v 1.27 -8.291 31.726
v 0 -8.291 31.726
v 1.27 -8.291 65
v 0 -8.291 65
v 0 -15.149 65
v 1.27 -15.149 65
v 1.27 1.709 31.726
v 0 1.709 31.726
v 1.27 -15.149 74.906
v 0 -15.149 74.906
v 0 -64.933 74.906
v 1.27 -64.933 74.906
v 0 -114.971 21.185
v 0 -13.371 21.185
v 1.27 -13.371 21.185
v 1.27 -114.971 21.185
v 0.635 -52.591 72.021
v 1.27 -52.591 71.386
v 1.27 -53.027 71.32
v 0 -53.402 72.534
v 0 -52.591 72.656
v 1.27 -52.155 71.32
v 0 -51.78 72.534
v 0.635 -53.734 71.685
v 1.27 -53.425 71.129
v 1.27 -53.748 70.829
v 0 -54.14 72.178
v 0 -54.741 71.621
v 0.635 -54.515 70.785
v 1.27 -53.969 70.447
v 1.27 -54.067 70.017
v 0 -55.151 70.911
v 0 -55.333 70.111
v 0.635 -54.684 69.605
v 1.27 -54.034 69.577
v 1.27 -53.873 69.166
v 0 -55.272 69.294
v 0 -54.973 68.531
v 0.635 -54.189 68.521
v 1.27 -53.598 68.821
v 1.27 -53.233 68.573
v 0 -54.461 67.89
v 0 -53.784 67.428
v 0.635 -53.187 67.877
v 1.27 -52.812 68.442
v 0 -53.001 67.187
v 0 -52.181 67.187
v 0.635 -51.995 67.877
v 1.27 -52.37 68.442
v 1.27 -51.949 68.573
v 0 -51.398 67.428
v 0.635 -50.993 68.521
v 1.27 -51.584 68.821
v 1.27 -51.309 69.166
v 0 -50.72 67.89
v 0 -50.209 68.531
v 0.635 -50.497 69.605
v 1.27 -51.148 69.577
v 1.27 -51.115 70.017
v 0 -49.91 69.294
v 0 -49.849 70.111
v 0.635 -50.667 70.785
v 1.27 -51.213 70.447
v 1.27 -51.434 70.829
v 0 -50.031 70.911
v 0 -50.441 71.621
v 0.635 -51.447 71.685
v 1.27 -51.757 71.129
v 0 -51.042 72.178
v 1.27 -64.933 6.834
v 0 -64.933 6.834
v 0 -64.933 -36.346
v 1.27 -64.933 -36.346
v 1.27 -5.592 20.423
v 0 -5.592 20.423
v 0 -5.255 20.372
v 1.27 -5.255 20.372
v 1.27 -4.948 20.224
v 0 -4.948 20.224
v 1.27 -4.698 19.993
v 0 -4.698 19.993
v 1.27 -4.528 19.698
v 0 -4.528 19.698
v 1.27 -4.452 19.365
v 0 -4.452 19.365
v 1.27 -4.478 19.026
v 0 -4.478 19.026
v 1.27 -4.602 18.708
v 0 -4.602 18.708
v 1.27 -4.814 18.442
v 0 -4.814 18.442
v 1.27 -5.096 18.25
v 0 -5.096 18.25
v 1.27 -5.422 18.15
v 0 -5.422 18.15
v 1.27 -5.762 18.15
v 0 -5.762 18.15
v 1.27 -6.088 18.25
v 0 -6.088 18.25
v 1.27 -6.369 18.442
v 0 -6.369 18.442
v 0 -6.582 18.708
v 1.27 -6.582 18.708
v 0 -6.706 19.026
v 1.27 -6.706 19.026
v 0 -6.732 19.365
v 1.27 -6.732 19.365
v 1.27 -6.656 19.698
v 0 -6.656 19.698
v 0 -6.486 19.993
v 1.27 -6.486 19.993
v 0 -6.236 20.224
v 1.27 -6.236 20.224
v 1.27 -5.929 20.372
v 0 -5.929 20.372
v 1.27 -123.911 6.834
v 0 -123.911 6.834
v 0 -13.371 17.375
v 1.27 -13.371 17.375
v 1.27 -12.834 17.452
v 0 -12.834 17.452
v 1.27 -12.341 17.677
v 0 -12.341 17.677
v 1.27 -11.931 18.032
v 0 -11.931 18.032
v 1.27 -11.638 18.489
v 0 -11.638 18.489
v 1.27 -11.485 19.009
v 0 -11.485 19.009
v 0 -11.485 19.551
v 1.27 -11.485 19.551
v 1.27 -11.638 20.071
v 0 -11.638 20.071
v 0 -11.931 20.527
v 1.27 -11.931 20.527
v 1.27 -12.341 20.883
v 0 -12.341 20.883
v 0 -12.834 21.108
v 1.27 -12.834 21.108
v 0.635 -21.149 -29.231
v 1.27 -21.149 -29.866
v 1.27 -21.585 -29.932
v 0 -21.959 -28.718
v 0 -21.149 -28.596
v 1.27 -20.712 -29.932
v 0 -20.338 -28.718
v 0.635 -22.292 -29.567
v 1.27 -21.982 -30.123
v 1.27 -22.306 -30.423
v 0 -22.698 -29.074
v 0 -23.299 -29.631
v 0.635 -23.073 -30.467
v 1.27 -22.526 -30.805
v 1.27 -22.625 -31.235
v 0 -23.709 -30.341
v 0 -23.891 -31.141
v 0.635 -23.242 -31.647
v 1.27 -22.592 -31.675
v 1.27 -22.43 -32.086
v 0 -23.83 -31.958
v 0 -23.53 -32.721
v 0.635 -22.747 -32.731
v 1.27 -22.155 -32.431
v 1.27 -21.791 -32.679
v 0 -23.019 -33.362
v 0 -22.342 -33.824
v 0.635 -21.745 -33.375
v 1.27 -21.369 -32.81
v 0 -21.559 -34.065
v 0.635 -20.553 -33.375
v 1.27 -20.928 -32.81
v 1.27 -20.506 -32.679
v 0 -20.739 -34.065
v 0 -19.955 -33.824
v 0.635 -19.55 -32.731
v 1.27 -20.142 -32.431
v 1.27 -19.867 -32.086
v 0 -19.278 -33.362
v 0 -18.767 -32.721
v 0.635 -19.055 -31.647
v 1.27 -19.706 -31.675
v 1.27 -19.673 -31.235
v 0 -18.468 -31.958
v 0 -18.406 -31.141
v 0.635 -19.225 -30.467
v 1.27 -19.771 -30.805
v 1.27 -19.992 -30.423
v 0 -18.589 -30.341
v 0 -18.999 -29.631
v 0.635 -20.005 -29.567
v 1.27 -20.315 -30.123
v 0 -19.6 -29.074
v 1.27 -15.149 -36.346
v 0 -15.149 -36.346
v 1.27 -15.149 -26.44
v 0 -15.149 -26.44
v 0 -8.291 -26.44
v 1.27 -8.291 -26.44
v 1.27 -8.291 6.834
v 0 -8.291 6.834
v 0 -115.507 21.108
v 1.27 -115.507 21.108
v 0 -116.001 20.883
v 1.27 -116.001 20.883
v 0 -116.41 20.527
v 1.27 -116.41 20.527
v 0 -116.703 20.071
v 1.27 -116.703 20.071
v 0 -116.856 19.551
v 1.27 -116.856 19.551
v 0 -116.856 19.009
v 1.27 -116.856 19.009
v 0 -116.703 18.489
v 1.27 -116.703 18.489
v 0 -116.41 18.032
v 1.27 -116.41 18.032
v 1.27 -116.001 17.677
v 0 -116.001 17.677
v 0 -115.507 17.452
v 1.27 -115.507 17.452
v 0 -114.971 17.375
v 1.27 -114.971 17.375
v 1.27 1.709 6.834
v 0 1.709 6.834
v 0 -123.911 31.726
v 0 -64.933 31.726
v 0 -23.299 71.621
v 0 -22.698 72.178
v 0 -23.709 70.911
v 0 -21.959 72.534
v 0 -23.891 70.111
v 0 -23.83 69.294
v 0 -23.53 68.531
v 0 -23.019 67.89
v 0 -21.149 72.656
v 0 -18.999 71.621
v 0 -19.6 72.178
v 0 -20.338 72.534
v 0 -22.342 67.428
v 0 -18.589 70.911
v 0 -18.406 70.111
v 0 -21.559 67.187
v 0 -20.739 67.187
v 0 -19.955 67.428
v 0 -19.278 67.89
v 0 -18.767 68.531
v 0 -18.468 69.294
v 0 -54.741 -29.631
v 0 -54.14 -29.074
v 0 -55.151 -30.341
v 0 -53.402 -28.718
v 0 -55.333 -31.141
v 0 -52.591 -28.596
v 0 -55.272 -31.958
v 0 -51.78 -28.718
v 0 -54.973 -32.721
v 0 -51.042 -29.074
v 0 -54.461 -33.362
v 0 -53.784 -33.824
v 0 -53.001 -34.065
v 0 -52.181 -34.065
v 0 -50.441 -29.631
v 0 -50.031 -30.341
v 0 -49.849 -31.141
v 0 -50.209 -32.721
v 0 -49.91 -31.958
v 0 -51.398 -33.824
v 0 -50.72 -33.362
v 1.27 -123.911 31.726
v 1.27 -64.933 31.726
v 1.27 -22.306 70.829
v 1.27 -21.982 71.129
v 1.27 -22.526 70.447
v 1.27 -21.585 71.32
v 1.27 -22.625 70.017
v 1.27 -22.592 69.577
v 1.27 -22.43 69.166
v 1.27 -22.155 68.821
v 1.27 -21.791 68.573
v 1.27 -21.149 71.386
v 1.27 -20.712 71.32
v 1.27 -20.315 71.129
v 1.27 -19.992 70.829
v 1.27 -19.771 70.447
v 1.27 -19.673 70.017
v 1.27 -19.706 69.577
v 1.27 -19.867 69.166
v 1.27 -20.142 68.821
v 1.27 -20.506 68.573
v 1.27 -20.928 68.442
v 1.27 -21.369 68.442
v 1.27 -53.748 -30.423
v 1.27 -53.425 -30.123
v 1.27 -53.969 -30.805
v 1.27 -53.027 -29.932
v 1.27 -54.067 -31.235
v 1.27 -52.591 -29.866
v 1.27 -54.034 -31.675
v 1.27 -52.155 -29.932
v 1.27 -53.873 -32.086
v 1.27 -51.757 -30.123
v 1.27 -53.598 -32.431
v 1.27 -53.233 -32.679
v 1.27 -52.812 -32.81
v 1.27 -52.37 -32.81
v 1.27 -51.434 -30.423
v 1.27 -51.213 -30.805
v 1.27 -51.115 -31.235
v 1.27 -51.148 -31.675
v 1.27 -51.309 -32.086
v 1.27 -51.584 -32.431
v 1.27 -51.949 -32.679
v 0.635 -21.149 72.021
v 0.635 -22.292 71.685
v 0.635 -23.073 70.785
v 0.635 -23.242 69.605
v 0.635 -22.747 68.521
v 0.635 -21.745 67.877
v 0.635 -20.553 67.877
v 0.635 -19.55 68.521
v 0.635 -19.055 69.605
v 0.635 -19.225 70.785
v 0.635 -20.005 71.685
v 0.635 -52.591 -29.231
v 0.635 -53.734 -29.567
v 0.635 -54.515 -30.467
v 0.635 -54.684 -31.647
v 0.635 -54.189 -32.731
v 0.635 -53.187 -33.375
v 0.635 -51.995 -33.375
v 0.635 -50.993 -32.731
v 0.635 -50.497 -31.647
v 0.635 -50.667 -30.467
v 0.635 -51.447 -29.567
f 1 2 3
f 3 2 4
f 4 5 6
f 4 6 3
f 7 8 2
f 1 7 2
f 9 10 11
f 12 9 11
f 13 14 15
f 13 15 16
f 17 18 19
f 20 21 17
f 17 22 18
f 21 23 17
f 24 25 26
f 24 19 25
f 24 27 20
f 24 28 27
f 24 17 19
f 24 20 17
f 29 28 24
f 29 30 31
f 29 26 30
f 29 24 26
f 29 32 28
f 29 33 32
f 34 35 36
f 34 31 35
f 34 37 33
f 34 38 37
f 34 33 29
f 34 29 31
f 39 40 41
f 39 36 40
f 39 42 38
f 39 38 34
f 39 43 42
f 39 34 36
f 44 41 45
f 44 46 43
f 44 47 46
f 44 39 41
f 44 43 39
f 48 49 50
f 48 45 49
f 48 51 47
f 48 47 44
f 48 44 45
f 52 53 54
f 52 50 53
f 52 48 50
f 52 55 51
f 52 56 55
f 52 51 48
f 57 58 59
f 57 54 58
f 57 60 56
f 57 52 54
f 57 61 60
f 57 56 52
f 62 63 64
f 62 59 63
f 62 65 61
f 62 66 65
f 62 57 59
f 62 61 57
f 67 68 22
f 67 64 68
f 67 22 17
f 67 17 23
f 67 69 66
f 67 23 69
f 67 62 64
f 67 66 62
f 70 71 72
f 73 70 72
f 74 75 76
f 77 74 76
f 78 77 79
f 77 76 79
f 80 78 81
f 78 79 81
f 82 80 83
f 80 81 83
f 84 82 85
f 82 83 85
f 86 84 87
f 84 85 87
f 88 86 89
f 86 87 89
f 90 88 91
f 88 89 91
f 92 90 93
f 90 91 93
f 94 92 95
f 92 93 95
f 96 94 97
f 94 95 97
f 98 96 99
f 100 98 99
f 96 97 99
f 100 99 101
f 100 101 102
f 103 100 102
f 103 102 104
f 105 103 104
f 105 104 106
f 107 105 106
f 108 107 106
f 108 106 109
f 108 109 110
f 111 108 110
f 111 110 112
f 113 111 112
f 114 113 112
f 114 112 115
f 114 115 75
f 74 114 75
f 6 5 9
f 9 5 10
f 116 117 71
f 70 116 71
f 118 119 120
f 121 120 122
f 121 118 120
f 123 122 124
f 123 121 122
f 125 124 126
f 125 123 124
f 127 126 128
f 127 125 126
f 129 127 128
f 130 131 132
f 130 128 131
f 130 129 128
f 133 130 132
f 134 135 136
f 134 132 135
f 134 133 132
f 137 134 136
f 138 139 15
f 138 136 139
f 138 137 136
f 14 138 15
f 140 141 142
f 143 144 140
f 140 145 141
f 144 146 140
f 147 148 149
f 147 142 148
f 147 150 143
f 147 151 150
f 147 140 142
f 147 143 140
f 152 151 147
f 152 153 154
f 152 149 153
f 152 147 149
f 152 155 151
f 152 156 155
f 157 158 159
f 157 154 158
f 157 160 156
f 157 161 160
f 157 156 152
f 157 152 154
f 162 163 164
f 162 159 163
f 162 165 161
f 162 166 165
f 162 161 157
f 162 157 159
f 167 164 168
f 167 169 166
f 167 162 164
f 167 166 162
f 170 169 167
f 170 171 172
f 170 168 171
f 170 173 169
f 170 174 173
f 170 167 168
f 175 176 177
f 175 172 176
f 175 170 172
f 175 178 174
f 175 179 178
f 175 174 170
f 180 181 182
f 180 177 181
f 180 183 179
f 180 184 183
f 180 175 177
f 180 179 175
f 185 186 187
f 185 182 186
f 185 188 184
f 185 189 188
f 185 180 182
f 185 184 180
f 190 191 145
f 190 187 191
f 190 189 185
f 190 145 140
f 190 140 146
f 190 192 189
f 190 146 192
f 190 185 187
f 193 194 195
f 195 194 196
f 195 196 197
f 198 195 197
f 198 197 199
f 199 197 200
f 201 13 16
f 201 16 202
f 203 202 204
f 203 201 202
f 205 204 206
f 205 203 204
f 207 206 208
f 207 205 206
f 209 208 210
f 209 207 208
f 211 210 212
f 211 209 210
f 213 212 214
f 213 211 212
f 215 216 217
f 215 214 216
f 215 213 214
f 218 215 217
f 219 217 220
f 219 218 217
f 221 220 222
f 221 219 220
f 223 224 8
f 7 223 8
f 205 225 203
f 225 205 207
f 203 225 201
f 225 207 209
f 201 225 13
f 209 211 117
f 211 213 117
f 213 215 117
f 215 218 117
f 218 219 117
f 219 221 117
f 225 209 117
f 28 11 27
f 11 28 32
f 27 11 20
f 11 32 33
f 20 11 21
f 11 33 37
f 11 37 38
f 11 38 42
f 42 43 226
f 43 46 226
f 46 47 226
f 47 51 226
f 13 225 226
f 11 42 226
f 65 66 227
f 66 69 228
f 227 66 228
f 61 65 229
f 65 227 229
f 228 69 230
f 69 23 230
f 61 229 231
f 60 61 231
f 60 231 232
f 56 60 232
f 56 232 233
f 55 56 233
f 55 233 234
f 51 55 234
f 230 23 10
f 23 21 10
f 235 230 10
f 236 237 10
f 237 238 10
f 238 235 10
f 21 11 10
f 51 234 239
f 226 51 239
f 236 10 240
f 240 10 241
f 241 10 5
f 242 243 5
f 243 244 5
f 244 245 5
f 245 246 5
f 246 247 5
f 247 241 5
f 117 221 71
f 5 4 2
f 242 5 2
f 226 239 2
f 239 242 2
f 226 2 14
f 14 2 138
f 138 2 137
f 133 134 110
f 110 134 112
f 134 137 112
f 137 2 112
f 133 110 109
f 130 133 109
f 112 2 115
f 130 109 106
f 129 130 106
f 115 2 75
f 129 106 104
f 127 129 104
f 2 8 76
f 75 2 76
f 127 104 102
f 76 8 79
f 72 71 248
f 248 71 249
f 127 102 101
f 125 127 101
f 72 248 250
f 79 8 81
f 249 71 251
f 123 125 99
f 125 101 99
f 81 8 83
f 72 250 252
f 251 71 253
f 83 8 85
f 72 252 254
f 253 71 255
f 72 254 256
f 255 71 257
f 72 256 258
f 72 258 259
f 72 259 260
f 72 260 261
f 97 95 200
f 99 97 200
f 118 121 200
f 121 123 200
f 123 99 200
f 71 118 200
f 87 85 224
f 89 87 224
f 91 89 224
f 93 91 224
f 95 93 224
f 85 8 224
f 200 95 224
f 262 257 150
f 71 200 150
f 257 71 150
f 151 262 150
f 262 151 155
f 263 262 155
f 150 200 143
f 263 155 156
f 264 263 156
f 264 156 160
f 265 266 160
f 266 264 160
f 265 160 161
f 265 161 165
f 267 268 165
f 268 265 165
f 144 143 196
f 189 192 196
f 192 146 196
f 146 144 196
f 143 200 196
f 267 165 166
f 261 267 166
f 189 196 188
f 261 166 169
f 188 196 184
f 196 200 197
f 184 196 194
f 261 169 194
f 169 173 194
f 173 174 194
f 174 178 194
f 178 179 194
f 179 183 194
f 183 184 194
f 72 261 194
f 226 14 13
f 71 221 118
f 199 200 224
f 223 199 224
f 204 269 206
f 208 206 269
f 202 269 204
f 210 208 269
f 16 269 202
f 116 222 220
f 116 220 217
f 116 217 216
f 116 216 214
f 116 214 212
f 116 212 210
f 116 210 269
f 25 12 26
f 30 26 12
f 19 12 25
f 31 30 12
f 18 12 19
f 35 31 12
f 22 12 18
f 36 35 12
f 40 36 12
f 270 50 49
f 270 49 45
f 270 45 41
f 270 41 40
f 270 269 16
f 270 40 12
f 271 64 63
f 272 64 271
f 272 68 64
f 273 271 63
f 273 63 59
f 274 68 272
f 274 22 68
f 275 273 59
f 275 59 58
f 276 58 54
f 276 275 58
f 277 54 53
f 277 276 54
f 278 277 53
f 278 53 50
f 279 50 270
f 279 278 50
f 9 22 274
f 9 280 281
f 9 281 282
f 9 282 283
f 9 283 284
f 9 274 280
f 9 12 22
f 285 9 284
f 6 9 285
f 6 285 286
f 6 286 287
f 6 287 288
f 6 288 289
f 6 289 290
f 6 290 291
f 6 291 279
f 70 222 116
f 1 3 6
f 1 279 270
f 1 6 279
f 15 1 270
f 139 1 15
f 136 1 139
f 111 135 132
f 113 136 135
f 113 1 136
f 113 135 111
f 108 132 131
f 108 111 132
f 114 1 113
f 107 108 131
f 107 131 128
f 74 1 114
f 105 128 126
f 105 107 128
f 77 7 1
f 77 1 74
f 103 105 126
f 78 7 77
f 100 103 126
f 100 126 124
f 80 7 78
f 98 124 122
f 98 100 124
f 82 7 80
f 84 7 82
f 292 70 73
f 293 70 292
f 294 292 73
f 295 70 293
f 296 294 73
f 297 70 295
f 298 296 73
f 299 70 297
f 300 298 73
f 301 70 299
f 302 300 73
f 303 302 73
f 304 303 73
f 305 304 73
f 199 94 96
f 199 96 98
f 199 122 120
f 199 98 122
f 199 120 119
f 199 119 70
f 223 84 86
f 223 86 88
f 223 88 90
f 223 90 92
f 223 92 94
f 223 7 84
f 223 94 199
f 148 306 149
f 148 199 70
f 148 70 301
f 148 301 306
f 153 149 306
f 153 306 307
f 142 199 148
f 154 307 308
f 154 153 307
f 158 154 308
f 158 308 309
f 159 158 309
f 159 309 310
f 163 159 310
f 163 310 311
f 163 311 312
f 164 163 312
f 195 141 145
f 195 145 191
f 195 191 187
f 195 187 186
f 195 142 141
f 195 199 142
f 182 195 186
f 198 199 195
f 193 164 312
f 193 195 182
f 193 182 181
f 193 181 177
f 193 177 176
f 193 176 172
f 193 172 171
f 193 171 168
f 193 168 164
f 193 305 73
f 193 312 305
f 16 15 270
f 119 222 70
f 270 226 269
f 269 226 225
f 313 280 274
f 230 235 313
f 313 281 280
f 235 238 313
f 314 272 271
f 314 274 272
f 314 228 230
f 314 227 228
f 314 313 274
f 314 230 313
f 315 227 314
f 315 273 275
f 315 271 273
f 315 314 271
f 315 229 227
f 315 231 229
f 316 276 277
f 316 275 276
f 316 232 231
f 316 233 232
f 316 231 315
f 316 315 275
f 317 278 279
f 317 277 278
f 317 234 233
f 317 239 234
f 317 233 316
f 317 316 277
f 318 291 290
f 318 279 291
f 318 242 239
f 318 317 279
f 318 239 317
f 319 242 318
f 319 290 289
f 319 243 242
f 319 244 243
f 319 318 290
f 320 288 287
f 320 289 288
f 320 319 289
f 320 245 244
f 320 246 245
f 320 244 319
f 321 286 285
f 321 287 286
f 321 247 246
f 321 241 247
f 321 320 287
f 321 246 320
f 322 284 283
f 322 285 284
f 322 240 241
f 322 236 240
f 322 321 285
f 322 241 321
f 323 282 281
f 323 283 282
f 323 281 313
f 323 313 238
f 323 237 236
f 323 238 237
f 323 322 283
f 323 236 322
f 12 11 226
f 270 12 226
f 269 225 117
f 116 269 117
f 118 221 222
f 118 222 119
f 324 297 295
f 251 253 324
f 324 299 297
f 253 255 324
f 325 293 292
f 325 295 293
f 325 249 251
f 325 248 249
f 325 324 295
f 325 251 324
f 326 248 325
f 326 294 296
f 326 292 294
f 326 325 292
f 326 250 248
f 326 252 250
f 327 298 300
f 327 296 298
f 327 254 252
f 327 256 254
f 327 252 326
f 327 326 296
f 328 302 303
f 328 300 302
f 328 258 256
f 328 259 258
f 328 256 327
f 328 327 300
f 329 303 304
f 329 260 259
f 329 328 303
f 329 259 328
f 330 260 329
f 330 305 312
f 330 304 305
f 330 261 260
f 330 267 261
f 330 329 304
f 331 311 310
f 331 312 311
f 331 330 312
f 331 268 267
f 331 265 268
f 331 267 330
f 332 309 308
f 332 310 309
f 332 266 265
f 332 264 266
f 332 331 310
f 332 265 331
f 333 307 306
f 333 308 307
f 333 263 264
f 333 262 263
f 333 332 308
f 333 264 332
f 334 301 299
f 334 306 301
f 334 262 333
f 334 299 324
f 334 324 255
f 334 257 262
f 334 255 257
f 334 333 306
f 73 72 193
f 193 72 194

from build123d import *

# Parameters (mm, degrees)
BOSS_EXTRUDE1_DEPTH                          = 1.27
CUT_EXTRUDE2_REACH                           = 146.798
SKETCH7_W                                    = 9.906
SKETCH7_H                                    = 6.858
CUT_EXTRUDE3_REACH                           = 146.798
SKETCH18_R                                   = 1.143
CUT_EXTRUDE4_DEPTH                           = 2.54
CSK_FOR_M2_5_COUNTERSUNK_FLAT_HEAD_S_2_COUNT = 2
CSK_FOR_M2_5_COUNTERSUNK_FLAT_HEAD_S_2_PITCH = 31.442301831
CSK_FOR_M2_5_COUNTERSUNK_FLAT_HEAD_S_3_COUNT = 2
CSK_FOR_M2_5_COUNTERSUNK_FLAT_HEAD_S_3_PITCH = 101.252
CSK_FOR_M2_5_COUNTERSUNK_FLAT_HEAD_S_4_COUNT = 2
CSK_FOR_M2_5_COUNTERSUNK_FLAT_HEAD_S_4_PITCH = 106.021629154


with BuildPart() as part:
    # Sketch2 → Boss-Extrude1 (new body)
    with BuildSketch(Plane(origin=(0, 0, 0), x_dir=(0, 0, -1), z_dir=(1, 0, 0))):
        Polygon((36.346050031, -8.290645537), (-6.833949969, -8.290645537), (-6.833949969, 1.709354463), (-31.725949969, 1.709354463), (-31.725949969, -8.290645537), (-74.905949969, -8.290645537), (-74.905949969, -64.932645537), (-31.725949969, -64.932645537), (-31.725949969, -123.911447323), (-6.833949969, -123.911447323), (-6.833949969, -64.932645537), (36.346050031, -64.932645537), align=None)
    extrude(amount=BOSS_EXTRUDE1_DEPTH)

    # Sketch7 → Cut-Extrude2 (cut, up to next)
    with BuildSketch(Plane.ZY, mode=Mode.PRIVATE) as cut_extrude2_sk1:
        with Locations((-31.393050031, -11.719645537)):
            Rectangle(SKETCH7_W, SKETCH7_H)
    cut_extrude2_tool1 = extrude(cut_extrude2_sk1.sketch, amount=-CUT_EXTRUDE2_REACH, mode=Mode.PRIVATE) & part.part
    # Sketch7 → Cut-Extrude2 (cut, up to next)
    with BuildSketch(Plane.ZY, mode=Mode.PRIVATE) as cut_extrude2_sk2:
        with Locations((69.952949969, -11.719645537)):
            Rectangle(SKETCH7_W, SKETCH7_H)
    cut_extrude2_tool2 = extrude(cut_extrude2_sk2.sketch, amount=-CUT_EXTRUDE2_REACH, mode=Mode.PRIVATE) & part.part
    add(cut_extrude2_tool1.solids().sort_by_distance((0, -11.719646, -31.39305))[0], mode=Mode.SUBTRACT)
    add(cut_extrude2_tool2.solids().sort_by_distance((0, -11.719646, 69.95295))[0], mode=Mode.SUBTRACT)

    # Sketch10 → Cut-Extrude3 (cut, up to next)
    with BuildSketch(Plane.ZY, mode=Mode.PRIVATE) as cut_extrude3_sk1:
        with BuildLine():
            Line((21.184949969, -13.370645537), (21.184949969, -114.970645537))
            ThreePointArc((21.184949969, -114.970645537), (19.279949969, -116.875645537), (17.374949969, -114.970645537))
            Line((17.374949969, -114.970645537), (17.374949969, -13.370645537))
            ThreePointArc((17.374949969, -13.370645537), (19.279949969, -11.465645537), (21.184949969, -13.370645537))
        make_face()
    cut_extrude3_tool1 = extrude(cut_extrude3_sk1.sketch, amount=-CUT_EXTRUDE3_REACH, mode=Mode.PRIVATE) & part.part
    add(cut_extrude3_tool1.solids().sort_by_distance((0, -64.170646, 19.27995))[0], mode=Mode.SUBTRACT)

    # Sketch18 → Cut-Extrude4 (cut)
    with BuildSketch(Plane.ZY):
        with Locations((19.279949969, -5.591895537)):
            Circle(SKETCH18_R)
    extrude(amount=-CUT_EXTRUDE4_DEPTH, mode=Mode.SUBTRACT)

    # Sketch21 → CSK for M2.5 Countersunk Flat Head Screw1 (revolve, cut)
    with BuildSketch(Plane(origin=(0, -21.148645537, -31.346050031), x_dir=(0, 0, 1), z_dir=(0, 1, 0))):
        Polygon((0, 0), (0, 1.27), (1.45, 1.27), (1.45, 1.3), (2.75, 0), align=None)
    csk_for_m2_5_countersunk_flat_head_screw = revolve(axis=Axis((-6.35, -21.148645537, -31.346050031), (1, 0, 0)), mode=Mode.SUBTRACT)

    # CSK for M2.5 Countersunk Flat Head S 2: CSK for M2.5 Countersunk Flat Head Screw1 ×2
    with Locations(*[(0, -i * CSK_FOR_M2_5_COUNTERSUNK_FLAT_HEAD_S_2_PITCH, 0) for i in range(1, CSK_FOR_M2_5_COUNTERSUNK_FLAT_HEAD_S_2_COUNT)]):
        add(csk_for_m2_5_countersunk_flat_head_screw, mode=Mode.SUBTRACT)

    # CSK for M2.5 Countersunk Flat Head S 3: CSK for M2.5 Countersunk Flat Head Screw1 ×2
    with Locations(*[(0, 0, i * CSK_FOR_M2_5_COUNTERSUNK_FLAT_HEAD_S_3_PITCH) for i in range(1, CSK_FOR_M2_5_COUNTERSUNK_FLAT_HEAD_S_3_COUNT)]):
        add(csk_for_m2_5_countersunk_flat_head_screw, mode=Mode.SUBTRACT)

    # CSK for M2.5 Countersunk Flat Head S 4: CSK for M2.5 Countersunk Flat Head Screw1 ×2
    with Locations(*[Vector(0, -0.29656497529839515, 0.9550126781494905) * (i * CSK_FOR_M2_5_COUNTERSUNK_FLAT_HEAD_S_4_PITCH) for i in range(1, CSK_FOR_M2_5_COUNTERSUNK_FLAT_HEAD_S_4_COUNT)]):
        add(csk_for_m2_5_countersunk_flat_head_screw, mode=Mode.SUBTRACT)


solid = part.part
